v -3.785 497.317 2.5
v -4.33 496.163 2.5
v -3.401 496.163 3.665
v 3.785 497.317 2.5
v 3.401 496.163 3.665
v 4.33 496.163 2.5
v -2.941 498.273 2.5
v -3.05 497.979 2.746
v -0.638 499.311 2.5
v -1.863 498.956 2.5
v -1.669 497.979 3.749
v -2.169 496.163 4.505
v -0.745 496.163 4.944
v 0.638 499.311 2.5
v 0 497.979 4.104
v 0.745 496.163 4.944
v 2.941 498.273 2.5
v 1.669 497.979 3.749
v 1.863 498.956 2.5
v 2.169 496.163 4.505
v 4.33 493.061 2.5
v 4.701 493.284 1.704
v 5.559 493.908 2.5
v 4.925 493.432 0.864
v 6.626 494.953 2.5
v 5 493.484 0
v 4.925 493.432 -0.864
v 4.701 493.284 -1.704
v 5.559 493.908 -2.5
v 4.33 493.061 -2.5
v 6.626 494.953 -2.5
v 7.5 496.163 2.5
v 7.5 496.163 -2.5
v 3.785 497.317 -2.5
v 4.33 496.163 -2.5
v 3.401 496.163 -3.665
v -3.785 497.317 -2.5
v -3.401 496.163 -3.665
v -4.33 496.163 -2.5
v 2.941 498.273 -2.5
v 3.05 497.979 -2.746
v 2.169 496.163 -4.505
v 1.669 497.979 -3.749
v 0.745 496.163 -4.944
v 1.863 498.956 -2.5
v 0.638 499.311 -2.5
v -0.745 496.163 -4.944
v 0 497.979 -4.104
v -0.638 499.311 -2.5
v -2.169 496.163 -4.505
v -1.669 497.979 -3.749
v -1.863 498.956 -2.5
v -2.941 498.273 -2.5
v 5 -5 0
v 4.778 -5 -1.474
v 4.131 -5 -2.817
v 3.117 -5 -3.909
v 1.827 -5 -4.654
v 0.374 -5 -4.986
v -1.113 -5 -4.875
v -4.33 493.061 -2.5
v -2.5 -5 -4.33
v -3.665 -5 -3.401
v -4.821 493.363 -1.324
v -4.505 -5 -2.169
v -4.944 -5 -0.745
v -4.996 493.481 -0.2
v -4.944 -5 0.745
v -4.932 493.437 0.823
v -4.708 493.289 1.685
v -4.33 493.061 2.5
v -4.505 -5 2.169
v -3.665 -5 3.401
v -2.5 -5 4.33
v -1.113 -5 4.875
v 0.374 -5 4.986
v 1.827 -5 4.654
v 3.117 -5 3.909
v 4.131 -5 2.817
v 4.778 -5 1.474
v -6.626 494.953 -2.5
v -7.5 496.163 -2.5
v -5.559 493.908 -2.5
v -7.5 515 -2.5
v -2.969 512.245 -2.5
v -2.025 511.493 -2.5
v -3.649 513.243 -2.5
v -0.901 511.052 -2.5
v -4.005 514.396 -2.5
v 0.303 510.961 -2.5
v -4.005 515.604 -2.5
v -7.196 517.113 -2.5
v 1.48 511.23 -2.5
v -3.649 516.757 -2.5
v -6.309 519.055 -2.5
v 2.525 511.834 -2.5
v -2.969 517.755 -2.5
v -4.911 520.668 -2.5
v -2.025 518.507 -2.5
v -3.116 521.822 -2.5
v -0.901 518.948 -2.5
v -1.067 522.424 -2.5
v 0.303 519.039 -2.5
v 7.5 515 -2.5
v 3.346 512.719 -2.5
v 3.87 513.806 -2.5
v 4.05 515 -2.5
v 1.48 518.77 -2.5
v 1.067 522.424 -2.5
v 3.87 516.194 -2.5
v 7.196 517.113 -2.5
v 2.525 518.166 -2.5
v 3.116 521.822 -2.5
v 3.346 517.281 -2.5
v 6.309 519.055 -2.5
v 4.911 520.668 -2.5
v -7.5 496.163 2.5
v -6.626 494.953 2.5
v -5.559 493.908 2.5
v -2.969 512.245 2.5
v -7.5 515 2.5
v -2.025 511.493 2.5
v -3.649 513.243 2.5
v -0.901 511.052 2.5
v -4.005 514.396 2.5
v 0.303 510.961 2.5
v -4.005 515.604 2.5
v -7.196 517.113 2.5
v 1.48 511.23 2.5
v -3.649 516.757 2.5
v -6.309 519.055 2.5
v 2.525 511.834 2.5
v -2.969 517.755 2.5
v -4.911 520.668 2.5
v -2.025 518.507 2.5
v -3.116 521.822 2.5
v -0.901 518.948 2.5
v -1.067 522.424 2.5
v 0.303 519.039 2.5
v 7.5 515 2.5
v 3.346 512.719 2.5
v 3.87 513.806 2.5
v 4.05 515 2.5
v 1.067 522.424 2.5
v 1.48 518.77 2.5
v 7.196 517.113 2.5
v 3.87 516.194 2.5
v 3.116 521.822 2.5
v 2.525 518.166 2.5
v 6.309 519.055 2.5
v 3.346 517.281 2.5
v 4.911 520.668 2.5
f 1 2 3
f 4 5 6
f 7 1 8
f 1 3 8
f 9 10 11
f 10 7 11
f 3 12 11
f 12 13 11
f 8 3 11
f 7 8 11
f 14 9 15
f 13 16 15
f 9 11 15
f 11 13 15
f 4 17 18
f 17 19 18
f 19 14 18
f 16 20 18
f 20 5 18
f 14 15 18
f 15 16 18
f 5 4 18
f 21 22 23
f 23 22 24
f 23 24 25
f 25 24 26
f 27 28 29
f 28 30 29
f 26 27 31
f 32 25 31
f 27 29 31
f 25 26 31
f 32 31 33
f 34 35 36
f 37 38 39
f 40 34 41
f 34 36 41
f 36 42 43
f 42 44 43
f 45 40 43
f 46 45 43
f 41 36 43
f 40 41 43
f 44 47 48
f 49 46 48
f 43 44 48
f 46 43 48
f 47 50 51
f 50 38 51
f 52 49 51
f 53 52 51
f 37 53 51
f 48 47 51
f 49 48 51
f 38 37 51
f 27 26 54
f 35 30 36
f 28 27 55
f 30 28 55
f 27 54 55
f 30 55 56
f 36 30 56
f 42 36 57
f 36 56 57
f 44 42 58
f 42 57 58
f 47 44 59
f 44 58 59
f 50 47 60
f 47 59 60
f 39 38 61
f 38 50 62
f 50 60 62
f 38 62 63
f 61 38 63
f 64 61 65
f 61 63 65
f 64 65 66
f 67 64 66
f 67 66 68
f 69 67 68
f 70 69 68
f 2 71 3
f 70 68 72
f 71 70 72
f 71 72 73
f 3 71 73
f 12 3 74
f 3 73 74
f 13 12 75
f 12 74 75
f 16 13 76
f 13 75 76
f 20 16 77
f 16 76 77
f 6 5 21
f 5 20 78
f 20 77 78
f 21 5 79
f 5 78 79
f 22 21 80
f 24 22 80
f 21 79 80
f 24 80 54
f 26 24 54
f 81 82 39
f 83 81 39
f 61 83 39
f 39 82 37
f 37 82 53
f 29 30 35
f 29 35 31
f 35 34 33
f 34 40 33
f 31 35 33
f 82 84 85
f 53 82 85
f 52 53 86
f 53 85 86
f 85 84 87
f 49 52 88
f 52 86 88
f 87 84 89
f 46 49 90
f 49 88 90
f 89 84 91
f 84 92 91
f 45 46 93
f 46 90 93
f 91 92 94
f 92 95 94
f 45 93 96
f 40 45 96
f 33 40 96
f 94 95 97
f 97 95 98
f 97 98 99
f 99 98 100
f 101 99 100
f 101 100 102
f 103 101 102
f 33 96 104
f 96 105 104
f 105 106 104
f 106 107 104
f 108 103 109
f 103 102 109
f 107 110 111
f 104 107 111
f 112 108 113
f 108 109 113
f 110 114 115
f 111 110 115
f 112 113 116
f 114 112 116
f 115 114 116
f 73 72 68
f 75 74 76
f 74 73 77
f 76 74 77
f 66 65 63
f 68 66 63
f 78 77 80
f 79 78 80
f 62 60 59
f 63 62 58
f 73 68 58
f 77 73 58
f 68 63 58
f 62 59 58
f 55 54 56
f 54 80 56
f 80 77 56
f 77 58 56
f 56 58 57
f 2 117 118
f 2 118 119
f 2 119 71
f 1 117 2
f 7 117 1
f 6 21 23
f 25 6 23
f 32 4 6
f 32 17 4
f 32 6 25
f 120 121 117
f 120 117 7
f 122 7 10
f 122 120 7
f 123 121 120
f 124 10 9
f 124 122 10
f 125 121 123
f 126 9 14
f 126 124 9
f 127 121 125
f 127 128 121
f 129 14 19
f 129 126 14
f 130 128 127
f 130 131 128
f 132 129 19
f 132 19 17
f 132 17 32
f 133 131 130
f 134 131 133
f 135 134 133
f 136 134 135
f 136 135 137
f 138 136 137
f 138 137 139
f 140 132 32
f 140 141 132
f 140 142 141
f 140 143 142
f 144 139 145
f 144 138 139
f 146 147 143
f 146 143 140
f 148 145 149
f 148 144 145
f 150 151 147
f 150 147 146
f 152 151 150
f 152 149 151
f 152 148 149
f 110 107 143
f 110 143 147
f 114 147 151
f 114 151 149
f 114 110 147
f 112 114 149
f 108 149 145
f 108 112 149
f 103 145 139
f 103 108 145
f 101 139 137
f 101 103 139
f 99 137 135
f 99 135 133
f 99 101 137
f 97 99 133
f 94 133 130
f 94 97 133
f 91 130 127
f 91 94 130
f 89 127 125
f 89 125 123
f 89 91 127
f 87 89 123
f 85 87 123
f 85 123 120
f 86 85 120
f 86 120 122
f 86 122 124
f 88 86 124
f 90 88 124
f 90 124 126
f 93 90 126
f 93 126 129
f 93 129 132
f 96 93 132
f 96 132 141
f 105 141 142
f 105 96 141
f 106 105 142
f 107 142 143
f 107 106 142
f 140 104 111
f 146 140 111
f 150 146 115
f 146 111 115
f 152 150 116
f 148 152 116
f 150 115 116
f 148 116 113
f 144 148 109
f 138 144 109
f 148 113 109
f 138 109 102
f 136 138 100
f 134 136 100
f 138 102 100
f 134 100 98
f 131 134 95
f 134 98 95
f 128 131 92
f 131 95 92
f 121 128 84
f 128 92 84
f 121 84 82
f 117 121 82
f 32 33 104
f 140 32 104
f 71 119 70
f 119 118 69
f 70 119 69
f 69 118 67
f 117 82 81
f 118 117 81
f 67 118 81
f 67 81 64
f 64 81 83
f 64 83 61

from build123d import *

# Parameters (mm, degrees)
CLEVIS_START = -4e-06
SKETCH6_R    = 4.05
CLEVIS_DEPTH = 5.00001


with BuildPart() as part:
    # Sketch5 → Body (revolve)
    with BuildSketch(Plane.XY):
        with BuildLine():
            Line((5, 496.16336506), (5, -5))
            Line((5, -5), (0, -5))
            Line((0, -5), (0, 500))
            ThreePointArc((0, 500), (3.151181035, 498.930318177), (5, 496.16336506))
        make_face()
    revolve(axis=Axis((0, -5, 0), (0, 1, 0)))

    # Sketch6 → Clevis (add)
    with BuildSketch(Plane.XY.offset(-2.5).offset(CLEVIS_START)):
        with BuildLine():
            Line((-7.5, 515), (-7.5, 496.16336506))
            ThreePointArc((-7.5, 496.16336506), (0, 491.912847956), (7.5, 496.16336506))
            Line((7.5, 496.16336506), (7.5, 515))
            ThreePointArc((7.5, 515), (0, 522.5), (-7.5, 515))
        make_face()
        with Locations((0, 515)):
            Circle(SKETCH6_R, mode=Mode.SUBTRACT)
    extrude(amount=CLEVIS_DEPTH)


solid = part.part
